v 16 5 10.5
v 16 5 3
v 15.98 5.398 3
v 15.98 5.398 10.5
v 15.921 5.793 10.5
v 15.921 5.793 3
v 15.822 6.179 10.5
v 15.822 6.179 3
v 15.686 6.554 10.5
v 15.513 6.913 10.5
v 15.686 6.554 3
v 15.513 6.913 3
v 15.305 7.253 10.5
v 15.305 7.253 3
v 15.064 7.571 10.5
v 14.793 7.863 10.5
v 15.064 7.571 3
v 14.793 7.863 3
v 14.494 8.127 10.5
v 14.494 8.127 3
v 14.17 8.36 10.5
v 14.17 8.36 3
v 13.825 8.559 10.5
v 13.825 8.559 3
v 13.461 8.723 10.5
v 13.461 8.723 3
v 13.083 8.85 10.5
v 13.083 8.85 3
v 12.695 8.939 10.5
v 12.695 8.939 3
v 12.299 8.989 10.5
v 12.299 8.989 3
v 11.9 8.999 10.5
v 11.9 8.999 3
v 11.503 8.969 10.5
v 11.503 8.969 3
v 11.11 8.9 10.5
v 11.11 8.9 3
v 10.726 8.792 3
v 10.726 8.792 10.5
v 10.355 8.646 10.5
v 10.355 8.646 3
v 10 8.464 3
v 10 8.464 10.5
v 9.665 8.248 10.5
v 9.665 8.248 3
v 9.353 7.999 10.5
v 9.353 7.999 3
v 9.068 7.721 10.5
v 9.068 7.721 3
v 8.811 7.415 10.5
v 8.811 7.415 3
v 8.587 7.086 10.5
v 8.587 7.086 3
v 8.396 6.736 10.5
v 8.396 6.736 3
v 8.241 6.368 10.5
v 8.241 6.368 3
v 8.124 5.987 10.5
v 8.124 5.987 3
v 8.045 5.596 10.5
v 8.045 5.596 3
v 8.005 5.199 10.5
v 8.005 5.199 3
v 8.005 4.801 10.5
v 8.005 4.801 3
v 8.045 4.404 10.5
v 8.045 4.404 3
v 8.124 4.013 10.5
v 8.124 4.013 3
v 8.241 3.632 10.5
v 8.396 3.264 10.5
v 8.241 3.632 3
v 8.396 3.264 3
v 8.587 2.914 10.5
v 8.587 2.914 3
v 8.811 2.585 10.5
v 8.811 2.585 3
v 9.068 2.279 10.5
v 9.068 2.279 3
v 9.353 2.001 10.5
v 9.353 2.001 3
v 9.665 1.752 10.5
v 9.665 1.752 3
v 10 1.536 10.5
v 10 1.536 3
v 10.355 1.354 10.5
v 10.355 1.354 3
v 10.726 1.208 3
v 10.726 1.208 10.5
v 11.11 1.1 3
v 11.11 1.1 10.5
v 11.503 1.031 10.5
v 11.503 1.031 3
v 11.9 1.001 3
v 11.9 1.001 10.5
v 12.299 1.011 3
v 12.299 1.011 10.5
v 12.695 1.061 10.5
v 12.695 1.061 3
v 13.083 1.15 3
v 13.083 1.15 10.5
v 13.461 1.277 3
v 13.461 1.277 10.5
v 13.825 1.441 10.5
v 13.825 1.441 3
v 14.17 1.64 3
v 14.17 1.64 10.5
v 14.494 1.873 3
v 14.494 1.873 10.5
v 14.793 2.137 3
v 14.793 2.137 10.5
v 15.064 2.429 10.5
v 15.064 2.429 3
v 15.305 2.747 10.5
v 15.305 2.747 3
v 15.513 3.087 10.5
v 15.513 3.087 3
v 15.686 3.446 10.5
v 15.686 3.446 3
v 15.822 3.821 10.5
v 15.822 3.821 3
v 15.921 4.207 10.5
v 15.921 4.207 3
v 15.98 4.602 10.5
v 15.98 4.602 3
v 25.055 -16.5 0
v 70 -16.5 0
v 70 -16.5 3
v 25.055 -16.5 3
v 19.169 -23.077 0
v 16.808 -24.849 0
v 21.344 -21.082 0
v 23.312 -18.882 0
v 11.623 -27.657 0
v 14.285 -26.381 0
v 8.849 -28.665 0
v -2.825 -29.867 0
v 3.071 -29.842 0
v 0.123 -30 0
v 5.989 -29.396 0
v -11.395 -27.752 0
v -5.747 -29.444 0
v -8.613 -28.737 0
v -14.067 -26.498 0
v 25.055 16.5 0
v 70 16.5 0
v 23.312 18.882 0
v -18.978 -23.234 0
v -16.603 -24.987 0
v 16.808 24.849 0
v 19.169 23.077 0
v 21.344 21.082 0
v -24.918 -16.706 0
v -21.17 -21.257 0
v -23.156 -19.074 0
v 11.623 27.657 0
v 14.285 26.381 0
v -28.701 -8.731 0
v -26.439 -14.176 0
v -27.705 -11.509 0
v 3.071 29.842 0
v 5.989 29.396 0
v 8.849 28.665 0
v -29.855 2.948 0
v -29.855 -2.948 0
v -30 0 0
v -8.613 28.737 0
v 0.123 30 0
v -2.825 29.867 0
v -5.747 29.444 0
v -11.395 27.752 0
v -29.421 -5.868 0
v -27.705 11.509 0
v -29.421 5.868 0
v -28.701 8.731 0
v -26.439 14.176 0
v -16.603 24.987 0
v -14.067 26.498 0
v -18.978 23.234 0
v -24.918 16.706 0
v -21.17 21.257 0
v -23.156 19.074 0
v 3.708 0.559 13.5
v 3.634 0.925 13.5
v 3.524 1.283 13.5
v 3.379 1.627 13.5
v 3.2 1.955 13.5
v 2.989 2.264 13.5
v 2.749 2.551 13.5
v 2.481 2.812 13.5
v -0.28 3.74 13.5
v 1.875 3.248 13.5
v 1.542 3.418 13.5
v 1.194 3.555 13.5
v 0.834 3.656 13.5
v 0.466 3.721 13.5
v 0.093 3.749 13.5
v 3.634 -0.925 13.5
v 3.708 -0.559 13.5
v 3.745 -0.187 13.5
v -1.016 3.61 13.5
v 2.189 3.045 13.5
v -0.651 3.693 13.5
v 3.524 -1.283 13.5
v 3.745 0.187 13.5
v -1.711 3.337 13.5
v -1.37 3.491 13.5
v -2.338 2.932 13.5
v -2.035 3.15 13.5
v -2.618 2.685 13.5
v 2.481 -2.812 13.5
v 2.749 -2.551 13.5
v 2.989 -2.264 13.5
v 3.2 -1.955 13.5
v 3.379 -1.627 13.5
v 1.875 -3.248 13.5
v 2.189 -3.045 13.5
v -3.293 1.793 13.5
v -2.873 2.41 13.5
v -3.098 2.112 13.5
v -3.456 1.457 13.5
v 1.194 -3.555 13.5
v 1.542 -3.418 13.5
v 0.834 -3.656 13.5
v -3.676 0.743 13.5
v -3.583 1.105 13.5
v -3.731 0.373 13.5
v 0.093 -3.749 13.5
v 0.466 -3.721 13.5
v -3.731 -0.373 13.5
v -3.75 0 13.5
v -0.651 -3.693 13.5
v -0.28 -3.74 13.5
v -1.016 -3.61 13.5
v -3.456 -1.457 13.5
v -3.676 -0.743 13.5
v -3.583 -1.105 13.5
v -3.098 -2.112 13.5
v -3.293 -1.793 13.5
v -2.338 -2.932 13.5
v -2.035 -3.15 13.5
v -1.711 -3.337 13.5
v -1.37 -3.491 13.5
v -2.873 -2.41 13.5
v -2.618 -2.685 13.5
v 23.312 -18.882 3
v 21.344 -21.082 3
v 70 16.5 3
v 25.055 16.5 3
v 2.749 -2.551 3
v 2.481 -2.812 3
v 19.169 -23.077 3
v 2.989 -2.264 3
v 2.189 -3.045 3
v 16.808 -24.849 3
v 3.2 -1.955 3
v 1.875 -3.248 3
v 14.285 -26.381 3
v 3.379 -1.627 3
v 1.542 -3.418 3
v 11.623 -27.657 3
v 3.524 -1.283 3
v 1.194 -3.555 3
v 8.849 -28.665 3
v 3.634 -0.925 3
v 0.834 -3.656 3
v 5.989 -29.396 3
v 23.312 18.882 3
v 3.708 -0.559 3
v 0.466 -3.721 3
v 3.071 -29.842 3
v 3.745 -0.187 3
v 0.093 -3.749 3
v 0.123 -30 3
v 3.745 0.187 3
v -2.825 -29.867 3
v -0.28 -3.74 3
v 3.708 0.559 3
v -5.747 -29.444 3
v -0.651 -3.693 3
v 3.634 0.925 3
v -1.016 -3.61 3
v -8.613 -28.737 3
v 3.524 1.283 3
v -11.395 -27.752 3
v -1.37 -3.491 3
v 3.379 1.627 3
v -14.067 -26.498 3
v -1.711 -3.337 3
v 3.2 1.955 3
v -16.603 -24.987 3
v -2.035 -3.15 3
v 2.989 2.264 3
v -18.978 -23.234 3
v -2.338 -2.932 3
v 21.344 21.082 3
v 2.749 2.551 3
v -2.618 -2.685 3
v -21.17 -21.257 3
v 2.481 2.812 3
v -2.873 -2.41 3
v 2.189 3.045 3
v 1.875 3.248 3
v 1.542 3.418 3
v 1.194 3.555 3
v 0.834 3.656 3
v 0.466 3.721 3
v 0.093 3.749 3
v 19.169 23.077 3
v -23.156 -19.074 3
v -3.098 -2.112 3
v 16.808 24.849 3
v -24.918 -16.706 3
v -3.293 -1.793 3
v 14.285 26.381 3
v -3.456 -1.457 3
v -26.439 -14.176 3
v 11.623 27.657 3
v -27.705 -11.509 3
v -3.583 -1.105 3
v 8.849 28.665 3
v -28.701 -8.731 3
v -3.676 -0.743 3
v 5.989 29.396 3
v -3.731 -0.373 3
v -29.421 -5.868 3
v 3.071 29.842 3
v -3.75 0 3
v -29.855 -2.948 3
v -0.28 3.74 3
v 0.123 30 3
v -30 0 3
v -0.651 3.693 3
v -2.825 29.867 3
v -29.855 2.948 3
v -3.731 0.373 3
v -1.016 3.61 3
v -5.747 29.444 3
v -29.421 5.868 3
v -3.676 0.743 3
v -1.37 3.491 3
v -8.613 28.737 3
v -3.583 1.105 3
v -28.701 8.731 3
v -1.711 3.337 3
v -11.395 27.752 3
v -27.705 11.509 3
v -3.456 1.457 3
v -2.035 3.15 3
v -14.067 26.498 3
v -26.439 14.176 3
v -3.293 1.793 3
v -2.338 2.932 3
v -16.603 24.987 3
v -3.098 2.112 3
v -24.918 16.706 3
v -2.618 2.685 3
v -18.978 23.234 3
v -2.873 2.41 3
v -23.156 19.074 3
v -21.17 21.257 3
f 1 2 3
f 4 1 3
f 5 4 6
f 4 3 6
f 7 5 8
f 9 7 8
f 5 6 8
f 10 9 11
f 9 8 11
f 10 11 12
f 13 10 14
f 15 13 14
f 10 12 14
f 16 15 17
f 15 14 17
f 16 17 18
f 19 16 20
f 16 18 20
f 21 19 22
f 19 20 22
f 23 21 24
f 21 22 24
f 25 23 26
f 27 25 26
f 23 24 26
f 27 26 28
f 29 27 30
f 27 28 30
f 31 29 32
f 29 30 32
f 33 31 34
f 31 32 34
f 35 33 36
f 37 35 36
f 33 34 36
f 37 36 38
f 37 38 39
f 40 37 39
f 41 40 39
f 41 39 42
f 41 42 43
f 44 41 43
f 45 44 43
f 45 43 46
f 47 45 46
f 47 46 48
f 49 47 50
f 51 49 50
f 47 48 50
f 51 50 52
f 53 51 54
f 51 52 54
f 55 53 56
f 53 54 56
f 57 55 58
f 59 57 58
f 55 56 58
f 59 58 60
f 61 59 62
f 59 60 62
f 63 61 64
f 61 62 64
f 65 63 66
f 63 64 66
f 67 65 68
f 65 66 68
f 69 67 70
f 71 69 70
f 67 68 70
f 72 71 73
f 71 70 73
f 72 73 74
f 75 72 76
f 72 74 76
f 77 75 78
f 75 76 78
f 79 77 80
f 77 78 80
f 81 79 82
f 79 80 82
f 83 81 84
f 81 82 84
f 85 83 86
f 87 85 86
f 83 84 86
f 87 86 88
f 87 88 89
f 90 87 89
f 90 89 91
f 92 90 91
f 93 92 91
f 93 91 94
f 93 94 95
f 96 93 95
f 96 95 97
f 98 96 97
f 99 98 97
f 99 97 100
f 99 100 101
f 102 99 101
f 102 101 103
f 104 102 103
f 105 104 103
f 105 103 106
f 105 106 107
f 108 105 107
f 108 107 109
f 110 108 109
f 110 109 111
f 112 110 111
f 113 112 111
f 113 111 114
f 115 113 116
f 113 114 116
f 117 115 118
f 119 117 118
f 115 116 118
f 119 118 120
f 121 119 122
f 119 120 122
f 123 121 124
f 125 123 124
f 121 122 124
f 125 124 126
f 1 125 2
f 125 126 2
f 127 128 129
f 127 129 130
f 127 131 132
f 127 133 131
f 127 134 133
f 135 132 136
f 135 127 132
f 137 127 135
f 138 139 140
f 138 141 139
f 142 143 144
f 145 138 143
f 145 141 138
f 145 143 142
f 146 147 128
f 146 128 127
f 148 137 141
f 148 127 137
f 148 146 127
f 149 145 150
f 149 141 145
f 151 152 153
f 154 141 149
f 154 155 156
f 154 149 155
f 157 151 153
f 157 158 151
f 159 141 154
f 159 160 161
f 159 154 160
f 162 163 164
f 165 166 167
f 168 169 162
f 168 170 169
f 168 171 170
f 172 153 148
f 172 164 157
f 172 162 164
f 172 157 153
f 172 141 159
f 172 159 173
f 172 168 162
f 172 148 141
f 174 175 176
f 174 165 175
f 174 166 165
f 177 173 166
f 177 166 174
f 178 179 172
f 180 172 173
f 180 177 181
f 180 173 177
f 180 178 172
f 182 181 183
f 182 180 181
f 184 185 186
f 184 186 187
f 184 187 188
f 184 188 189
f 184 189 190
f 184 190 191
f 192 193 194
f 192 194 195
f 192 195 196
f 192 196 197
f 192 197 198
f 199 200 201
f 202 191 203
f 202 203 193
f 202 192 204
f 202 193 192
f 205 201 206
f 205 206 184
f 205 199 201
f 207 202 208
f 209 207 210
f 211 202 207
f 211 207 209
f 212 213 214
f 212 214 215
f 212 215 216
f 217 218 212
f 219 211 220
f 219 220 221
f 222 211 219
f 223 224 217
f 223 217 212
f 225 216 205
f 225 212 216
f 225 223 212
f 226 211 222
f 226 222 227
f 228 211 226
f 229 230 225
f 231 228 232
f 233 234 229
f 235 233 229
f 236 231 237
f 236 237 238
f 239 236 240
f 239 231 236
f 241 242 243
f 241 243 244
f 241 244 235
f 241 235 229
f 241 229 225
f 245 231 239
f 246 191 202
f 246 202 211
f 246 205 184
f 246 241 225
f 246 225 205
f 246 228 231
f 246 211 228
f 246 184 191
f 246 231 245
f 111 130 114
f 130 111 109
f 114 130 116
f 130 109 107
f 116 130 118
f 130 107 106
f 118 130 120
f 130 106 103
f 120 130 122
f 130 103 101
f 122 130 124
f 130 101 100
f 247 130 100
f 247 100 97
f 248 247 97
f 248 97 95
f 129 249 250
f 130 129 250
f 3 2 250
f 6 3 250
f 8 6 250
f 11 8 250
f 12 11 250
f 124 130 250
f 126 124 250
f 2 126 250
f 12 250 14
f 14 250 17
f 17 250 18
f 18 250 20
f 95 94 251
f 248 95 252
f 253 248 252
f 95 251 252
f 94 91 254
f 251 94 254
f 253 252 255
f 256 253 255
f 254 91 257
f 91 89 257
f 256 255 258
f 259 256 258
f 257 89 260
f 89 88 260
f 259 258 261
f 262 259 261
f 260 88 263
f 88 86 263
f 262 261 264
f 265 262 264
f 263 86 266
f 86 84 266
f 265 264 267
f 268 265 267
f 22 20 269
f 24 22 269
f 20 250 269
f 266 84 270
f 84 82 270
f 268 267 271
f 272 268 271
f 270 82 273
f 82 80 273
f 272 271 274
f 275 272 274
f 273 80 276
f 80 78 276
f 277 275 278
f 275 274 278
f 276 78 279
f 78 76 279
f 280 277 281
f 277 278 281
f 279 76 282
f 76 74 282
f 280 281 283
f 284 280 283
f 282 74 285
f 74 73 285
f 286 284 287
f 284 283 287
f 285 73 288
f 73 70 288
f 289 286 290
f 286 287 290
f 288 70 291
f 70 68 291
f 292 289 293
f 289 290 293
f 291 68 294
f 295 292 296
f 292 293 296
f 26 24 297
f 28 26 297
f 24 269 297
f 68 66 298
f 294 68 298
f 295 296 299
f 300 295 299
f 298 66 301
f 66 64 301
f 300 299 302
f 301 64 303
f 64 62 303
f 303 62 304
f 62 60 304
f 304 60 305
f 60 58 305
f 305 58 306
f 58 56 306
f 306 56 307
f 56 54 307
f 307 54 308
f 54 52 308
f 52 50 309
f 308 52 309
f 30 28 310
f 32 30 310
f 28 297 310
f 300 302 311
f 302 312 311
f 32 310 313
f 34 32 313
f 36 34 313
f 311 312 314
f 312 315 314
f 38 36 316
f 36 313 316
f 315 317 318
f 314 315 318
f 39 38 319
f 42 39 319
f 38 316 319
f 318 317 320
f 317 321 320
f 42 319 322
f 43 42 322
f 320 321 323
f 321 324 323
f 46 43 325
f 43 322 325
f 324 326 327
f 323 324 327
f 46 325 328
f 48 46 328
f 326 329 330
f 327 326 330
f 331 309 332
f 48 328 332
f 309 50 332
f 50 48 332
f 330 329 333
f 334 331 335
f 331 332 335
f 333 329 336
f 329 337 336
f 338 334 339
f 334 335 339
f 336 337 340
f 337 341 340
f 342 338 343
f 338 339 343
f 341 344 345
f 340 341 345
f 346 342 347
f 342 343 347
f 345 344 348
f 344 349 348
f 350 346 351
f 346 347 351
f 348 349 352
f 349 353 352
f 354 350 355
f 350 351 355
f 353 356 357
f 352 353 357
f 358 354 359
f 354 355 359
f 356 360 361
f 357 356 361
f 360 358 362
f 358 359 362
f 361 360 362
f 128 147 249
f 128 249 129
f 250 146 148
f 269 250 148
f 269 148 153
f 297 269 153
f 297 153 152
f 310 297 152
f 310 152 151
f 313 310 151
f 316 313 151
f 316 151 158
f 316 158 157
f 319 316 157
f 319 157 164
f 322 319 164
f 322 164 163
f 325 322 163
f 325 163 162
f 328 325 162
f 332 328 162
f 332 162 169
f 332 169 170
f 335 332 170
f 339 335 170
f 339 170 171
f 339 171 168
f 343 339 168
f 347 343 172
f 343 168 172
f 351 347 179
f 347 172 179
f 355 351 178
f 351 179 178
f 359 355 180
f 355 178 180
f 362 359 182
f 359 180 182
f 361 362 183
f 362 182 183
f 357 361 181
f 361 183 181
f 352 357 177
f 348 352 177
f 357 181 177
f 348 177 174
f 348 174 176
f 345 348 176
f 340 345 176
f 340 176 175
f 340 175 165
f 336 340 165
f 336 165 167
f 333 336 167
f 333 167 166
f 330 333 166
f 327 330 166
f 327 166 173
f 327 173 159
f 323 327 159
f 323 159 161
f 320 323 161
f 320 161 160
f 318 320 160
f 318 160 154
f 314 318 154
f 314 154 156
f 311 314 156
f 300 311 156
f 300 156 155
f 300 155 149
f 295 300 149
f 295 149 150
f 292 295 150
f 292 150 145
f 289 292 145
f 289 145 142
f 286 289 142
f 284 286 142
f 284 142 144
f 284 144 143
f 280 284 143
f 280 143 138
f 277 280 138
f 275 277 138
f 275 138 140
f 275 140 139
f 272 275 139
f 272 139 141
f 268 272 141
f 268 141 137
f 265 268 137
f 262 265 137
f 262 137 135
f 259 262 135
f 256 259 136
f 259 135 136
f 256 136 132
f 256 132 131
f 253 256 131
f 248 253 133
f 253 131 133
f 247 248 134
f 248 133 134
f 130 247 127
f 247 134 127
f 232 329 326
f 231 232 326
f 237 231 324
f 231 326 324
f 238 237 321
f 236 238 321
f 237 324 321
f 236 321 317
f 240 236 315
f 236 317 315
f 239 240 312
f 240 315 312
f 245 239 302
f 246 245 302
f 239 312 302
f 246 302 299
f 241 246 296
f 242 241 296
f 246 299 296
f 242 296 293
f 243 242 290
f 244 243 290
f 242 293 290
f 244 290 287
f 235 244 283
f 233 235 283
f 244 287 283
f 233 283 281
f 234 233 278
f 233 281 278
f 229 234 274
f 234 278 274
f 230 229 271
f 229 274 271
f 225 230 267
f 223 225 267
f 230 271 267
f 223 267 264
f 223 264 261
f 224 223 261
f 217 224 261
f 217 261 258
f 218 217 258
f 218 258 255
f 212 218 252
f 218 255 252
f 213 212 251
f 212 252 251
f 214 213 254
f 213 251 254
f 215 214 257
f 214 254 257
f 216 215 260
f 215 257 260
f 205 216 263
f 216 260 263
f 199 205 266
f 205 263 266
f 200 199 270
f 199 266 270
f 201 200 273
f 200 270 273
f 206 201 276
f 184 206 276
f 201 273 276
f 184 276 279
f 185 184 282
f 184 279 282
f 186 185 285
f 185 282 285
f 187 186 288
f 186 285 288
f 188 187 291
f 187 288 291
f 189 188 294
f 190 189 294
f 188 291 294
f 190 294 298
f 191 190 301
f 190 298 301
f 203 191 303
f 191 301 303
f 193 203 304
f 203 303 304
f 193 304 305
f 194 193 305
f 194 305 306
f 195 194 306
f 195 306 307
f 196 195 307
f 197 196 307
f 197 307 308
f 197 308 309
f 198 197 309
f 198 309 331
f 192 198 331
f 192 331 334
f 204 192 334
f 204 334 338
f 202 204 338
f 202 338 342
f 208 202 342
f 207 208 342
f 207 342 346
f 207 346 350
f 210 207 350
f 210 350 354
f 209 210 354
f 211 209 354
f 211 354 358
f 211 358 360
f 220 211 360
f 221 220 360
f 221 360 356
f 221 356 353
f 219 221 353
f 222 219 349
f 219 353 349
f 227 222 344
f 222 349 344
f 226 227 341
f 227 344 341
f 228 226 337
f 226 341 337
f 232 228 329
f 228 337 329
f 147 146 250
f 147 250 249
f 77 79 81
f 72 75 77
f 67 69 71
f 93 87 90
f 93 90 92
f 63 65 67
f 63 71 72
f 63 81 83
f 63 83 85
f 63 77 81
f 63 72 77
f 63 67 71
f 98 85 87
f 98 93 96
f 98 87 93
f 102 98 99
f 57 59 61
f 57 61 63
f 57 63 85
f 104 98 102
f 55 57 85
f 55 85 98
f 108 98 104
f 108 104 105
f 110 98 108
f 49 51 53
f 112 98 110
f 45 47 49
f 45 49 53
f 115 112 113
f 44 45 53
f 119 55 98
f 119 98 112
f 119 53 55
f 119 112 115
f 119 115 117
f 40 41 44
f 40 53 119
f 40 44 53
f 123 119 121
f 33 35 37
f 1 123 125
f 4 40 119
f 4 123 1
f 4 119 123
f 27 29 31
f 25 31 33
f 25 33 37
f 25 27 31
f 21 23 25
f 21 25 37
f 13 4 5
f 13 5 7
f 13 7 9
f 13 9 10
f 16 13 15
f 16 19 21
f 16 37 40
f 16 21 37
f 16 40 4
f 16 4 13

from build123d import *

# Parameters (mm, degrees)
SKETCH1_R           = 30
BOSS_EXTRUDE1_DEPTH = 3
SKETCH2_R           = 3.75
BOSS_EXTRUDE2_DEPTH = 10.5
SKETCH3_R           = 4
BOSS_EXTRUDE3_DEPTH = 7.5
BOSS_EXTRUDE4_START = -3
BOSS_EXTRUDE4_DEPTH = 3


with BuildPart() as part:
    # Sketch1 → Boss-Extrude1 (new body)
    with BuildSketch(Plane.XY):
        Circle(SKETCH1_R)
    extrude(amount=BOSS_EXTRUDE1_DEPTH)

    # Sketch2 → Boss-Extrude2 (add)
    with BuildSketch(Plane.XY.offset(3)):
        with Locations(Location((0, 0, 0), (0, 0, 180))):
            Circle(SKETCH2_R)
    extrude(amount=BOSS_EXTRUDE2_DEPTH)

    # Sketch3 → Boss-Extrude3 (add)
    with BuildSketch(Plane.XY.offset(3)):
        with Locations((12, 5)):
            Circle(SKETCH3_R)
    extrude(amount=BOSS_EXTRUDE3_DEPTH)

    # Sketch4 → Boss-Extrude4 (add)
    with BuildSketch(Plane.XY.offset(3).offset(BOSS_EXTRUDE4_START)):
        with BuildLine():
            Line((25.054939633, 16.5), (70, 16.5))
            Line((70, 16.5), (70, -16.5))
            Line((70, -16.5), (25.054939633, -16.5))
            ThreePointArc((25.054939633, -16.5), (30, 0), (25.054939633, 16.5))
        make_face()
    extrude(amount=BOSS_EXTRUDE4_DEPTH)


solid = part.part
